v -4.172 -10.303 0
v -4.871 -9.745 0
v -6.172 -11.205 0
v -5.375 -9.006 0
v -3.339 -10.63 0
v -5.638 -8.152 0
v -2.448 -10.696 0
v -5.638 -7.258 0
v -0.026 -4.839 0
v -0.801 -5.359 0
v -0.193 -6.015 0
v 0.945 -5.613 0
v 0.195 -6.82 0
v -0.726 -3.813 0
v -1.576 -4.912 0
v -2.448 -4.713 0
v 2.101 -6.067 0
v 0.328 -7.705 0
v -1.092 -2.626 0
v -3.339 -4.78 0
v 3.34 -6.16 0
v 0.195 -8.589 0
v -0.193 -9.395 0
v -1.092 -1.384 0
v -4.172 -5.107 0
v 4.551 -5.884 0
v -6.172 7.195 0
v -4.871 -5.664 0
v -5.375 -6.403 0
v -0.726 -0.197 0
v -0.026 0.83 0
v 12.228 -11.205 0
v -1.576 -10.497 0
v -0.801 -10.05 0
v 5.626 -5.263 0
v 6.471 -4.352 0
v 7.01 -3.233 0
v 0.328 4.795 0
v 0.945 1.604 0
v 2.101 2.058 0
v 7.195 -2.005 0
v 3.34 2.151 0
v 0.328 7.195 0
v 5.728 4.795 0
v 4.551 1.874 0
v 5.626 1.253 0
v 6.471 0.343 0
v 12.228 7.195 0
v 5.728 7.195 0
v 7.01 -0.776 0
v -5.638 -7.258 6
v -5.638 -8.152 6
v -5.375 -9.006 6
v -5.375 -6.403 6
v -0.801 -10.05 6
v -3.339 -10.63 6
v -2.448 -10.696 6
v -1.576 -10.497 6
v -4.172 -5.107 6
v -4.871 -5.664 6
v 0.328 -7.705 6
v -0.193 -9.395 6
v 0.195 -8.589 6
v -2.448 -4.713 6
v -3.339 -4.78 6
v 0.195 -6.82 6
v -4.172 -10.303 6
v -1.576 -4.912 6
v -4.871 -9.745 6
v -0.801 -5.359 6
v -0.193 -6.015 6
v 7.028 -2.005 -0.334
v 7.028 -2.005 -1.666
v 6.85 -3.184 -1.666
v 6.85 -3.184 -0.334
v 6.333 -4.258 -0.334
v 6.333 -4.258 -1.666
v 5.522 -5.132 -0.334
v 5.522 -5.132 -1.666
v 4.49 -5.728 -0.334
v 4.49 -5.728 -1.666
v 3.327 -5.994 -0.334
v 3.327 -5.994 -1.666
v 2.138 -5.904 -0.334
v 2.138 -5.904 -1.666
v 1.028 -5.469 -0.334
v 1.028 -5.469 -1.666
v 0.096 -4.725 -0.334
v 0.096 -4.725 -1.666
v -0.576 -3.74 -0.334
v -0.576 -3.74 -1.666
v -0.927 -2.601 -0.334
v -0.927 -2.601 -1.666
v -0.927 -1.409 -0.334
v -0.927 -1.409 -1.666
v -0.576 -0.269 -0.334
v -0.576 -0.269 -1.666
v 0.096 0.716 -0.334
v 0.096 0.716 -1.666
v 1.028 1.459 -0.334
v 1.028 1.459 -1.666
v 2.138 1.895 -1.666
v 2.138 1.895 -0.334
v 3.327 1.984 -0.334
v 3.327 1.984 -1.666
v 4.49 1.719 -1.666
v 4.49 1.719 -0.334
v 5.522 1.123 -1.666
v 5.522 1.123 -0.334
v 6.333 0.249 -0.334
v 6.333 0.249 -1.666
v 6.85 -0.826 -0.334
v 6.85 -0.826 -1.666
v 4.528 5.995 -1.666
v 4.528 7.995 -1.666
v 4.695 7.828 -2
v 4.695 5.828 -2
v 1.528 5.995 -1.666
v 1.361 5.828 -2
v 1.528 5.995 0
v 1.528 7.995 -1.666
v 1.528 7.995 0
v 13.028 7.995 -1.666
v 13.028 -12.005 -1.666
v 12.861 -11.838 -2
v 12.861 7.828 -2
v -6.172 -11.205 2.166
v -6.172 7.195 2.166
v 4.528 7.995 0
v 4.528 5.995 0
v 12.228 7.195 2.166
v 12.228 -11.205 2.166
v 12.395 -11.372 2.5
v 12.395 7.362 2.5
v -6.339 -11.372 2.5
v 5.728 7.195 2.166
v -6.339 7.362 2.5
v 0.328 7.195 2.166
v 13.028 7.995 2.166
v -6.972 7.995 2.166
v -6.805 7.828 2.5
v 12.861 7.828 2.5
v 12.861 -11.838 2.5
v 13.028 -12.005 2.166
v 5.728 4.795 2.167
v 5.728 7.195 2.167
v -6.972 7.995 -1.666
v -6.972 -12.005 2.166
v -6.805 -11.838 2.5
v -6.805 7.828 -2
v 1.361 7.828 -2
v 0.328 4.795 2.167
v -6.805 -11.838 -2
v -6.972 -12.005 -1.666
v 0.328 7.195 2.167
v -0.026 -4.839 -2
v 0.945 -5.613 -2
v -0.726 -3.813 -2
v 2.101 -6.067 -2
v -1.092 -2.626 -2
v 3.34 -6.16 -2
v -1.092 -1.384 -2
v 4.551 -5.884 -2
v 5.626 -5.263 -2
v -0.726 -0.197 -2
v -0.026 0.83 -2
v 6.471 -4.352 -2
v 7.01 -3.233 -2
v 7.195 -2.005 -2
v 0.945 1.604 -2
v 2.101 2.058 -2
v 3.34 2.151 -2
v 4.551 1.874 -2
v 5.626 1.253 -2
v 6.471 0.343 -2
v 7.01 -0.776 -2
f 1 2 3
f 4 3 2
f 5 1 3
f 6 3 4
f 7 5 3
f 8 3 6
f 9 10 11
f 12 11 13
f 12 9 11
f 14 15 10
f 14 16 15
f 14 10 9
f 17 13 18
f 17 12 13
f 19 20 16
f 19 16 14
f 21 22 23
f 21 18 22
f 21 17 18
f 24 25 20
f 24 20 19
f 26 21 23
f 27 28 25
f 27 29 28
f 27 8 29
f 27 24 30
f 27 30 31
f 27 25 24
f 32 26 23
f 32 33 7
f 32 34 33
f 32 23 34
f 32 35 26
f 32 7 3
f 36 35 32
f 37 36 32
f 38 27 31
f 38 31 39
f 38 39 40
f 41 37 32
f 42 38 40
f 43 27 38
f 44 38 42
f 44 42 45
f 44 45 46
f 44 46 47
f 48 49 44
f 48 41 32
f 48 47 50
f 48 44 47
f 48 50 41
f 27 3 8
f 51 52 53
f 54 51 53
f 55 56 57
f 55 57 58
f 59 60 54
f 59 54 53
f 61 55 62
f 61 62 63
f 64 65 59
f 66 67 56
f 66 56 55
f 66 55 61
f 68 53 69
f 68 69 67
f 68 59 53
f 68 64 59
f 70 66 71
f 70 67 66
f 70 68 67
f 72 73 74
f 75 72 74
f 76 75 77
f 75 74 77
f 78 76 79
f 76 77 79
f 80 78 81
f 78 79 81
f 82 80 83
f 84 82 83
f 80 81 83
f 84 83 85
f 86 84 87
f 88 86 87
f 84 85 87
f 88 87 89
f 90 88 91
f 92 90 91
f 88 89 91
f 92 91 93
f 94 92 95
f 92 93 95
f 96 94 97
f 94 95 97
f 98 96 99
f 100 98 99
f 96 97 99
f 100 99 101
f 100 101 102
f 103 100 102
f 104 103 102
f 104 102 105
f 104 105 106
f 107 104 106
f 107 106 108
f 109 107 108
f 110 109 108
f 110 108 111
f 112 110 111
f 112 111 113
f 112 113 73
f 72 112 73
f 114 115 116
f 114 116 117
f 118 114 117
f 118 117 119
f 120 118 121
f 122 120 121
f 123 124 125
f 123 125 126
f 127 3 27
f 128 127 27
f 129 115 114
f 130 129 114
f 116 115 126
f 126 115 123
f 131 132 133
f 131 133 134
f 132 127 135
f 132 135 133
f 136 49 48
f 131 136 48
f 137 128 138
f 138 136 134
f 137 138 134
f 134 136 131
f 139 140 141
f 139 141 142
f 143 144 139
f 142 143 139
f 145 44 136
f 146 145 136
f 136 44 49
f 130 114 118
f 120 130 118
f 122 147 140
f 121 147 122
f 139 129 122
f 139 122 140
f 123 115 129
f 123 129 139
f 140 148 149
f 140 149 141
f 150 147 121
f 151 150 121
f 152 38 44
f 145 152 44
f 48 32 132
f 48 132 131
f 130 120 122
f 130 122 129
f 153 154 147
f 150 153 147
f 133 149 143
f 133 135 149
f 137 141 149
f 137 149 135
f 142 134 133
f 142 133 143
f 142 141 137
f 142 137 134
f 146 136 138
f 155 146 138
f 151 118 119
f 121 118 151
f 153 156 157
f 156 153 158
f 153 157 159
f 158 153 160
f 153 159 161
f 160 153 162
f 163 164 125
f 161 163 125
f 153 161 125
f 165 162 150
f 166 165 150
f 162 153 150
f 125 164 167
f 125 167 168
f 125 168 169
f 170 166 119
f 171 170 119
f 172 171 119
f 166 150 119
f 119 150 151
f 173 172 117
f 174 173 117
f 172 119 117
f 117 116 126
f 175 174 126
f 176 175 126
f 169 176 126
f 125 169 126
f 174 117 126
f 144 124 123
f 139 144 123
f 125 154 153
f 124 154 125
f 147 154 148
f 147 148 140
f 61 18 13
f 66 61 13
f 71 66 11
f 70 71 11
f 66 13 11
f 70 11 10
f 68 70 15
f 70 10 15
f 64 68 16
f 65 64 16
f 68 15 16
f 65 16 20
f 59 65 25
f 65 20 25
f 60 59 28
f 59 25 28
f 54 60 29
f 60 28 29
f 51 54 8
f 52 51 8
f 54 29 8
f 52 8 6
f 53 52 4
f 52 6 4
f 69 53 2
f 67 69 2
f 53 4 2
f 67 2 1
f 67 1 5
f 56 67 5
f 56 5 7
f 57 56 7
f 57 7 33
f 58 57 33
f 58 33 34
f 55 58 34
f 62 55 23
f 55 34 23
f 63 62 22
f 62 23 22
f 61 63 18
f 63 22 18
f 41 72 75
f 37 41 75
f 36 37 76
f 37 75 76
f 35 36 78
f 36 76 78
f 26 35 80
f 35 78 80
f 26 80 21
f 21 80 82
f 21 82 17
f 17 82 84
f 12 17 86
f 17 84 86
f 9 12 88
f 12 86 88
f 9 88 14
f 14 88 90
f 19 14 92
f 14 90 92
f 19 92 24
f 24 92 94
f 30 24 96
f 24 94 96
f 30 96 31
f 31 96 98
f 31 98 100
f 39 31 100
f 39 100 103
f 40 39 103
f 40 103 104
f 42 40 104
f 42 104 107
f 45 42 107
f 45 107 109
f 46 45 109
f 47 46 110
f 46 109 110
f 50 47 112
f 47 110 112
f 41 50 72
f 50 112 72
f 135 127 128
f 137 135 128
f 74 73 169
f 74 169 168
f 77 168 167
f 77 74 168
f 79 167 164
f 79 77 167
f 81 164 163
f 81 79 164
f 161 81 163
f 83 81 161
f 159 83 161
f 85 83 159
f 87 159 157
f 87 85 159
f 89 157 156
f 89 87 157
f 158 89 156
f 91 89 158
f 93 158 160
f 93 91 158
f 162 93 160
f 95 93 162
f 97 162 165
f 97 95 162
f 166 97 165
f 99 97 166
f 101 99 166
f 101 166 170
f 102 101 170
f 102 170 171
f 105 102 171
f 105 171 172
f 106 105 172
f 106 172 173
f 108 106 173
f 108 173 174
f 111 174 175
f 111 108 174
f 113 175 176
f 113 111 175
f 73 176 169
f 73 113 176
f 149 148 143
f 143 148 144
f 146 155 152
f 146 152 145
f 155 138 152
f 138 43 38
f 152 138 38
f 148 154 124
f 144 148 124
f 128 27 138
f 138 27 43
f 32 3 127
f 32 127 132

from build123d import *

# Parameters (mm, degrees)
F0_W      = 20
F0_H      = 20
F0_W_2    = 18.4
F0_H_2    = 18.4
F1_DEPTH  = 2
F2_DEPTH  = 2.5
F4_DEPTH  = 2
F5_SIZE2  = 0.334
F5_SIZE   = 0.167
F6_R      = 4
F7_DEPTH  = 4.501
F8_SIZE2  = 0.334
F8_SIZE   = 0.167
F9_SIZE2  = 0.334
F9_SIZE   = 0.167
F10_W     = 3
F10_H     = 1.2
F11_DEPTH = 2.167
F12_R     = 3
F13_DEPTH = 6


with BuildPart() as f1:
    # F0 (on Top) → F1 (new body)
    with BuildSketch(Plane.XY):
        with Locations((3.0281848833, -2.0047442615)):
            Rectangle(F0_W, F0_H)
        with Locations((3.0281848833, -2.0047442615)):
            Rectangle(F0_W_2, F0_H_2, mode=Mode.SUBTRACT)
        with Locations((3.0281848833, -2.0047442615)):
            Rectangle(F0_W_2, F0_H_2)
    extrude(amount=-F1_DEPTH)

    # F0 (on Top) → F2 (join)
    with BuildSketch(Plane.XY):
        with Locations((3.0281848833, -2.0047442615)):
            Rectangle(F0_W, F0_H)
        with Locations((3.0281848833, -2.0047442615)):
            Rectangle(F0_W_2, F0_H_2, mode=Mode.SUBTRACT)
    extrude(amount=F2_DEPTH)

    # F3 (on face) → F4 (cut)
    with BuildSketch(Plane(origin=(0, 0, -2), x_dir=(1, 0, 0), z_dir=(0, 0, -1))):
        Polygon((4.5281848833, -5.9952557385), (3.0281848833, -5.9952557385), (1.5281848833, -5.9952557385), (1.5281848833, -7.9952557385), (4.5281848833, -7.9952557385), align=None)
    extrude(amount=-F4_DEPTH, mode=Mode.SUBTRACT)

    # F5
    f5_edges = [f1.edges().sort_by_distance(p)[0] for p in [
        (13.028185, -2.004744, -2),
        (3.028185, -12.004744, -2),
        (-6.971815, -2.004744, -2),
        (-2.721815, 7.995256, -2),
        (1.528185, 6.995256, -2),
        (3.028185, 5.995256, -2),
        (4.528185, 6.995256, -2),
        (8.778185, 7.995256, -2),
    ]]
    f5_side = f1.faces().sort_by_distance((3.028185, -2.1418, -2))[0]
    chamfer(f5_edges, length=F5_SIZE, length2=F5_SIZE2, reference=f5_side)

    # F6 (on face) → F7 (cut, through all)
    with BuildSketch(Plane(origin=(0, 0, -2), x_dir=(1, 0, 0), z_dir=(0, 0, -1))):
        with Locations((3.0281848833, 2.0047442615)):
            Circle(F6_R)
    extrude(amount=-F7_DEPTH, mode=Mode.SUBTRACT)

    # F8
    f8_edges = [f1.edges().sort_by_distance(p)[0] for p in [
        (-0.971815, -2.004744, -2),
        (-0.971815, -2.004744, 0),
    ]]
    chamfer(f8_edges, length=F8_SIZE, length2=F8_SIZE2)

    # F9
    f9_edges = [f1.edges().sort_by_distance(p)[0] for p in [
        (3.028185, 7.995256, 2.5),
        (-6.971815, -2.004744, 2.5),
        (3.028185, -12.004744, 2.5),
        (13.028185, -2.004744, 2.5),
        (-6.171815, -2.004744, 2.5),
        (3.028185, 7.195256, 2.5),
        (12.228185, -2.004744, 2.5),
        (3.028185, -11.204744, 2.5),
    ]]
    f9_side = f1.faces().sort_by_distance((3.028185, 7.712413, 2.5))[0]
    chamfer(f9_edges, length=F9_SIZE, length2=F9_SIZE2, reference=f9_side)

    # F10 (on face) → F11 (join)
    with BuildSketch(Plane.XY):
        Polygon((4.5281848833, 5.9952557385), (1.5281848833, 5.9952557385), (1.5281848833, 7.1952557385), (0.3281848833, 7.1952557385), (0.3281848833, 4.7952557385), (5.7281848833, 4.7952557385), (5.7281848833, 7.1952557385), (4.5281848833, 7.1952557385), align=None)
        with Locations((3.0281848833, 6.5952557385)):
            Rectangle(F10_W, F10_H)
    extrude(amount=F11_DEPTH)

    # F12 (on face) → F13 (join)
    with BuildSketch(Plane.XY):
        with Locations((-2.6718151167, -7.7047442615)):
            Circle(F12_R)
    extrude(amount=F13_DEPTH)


solid = f1.part
